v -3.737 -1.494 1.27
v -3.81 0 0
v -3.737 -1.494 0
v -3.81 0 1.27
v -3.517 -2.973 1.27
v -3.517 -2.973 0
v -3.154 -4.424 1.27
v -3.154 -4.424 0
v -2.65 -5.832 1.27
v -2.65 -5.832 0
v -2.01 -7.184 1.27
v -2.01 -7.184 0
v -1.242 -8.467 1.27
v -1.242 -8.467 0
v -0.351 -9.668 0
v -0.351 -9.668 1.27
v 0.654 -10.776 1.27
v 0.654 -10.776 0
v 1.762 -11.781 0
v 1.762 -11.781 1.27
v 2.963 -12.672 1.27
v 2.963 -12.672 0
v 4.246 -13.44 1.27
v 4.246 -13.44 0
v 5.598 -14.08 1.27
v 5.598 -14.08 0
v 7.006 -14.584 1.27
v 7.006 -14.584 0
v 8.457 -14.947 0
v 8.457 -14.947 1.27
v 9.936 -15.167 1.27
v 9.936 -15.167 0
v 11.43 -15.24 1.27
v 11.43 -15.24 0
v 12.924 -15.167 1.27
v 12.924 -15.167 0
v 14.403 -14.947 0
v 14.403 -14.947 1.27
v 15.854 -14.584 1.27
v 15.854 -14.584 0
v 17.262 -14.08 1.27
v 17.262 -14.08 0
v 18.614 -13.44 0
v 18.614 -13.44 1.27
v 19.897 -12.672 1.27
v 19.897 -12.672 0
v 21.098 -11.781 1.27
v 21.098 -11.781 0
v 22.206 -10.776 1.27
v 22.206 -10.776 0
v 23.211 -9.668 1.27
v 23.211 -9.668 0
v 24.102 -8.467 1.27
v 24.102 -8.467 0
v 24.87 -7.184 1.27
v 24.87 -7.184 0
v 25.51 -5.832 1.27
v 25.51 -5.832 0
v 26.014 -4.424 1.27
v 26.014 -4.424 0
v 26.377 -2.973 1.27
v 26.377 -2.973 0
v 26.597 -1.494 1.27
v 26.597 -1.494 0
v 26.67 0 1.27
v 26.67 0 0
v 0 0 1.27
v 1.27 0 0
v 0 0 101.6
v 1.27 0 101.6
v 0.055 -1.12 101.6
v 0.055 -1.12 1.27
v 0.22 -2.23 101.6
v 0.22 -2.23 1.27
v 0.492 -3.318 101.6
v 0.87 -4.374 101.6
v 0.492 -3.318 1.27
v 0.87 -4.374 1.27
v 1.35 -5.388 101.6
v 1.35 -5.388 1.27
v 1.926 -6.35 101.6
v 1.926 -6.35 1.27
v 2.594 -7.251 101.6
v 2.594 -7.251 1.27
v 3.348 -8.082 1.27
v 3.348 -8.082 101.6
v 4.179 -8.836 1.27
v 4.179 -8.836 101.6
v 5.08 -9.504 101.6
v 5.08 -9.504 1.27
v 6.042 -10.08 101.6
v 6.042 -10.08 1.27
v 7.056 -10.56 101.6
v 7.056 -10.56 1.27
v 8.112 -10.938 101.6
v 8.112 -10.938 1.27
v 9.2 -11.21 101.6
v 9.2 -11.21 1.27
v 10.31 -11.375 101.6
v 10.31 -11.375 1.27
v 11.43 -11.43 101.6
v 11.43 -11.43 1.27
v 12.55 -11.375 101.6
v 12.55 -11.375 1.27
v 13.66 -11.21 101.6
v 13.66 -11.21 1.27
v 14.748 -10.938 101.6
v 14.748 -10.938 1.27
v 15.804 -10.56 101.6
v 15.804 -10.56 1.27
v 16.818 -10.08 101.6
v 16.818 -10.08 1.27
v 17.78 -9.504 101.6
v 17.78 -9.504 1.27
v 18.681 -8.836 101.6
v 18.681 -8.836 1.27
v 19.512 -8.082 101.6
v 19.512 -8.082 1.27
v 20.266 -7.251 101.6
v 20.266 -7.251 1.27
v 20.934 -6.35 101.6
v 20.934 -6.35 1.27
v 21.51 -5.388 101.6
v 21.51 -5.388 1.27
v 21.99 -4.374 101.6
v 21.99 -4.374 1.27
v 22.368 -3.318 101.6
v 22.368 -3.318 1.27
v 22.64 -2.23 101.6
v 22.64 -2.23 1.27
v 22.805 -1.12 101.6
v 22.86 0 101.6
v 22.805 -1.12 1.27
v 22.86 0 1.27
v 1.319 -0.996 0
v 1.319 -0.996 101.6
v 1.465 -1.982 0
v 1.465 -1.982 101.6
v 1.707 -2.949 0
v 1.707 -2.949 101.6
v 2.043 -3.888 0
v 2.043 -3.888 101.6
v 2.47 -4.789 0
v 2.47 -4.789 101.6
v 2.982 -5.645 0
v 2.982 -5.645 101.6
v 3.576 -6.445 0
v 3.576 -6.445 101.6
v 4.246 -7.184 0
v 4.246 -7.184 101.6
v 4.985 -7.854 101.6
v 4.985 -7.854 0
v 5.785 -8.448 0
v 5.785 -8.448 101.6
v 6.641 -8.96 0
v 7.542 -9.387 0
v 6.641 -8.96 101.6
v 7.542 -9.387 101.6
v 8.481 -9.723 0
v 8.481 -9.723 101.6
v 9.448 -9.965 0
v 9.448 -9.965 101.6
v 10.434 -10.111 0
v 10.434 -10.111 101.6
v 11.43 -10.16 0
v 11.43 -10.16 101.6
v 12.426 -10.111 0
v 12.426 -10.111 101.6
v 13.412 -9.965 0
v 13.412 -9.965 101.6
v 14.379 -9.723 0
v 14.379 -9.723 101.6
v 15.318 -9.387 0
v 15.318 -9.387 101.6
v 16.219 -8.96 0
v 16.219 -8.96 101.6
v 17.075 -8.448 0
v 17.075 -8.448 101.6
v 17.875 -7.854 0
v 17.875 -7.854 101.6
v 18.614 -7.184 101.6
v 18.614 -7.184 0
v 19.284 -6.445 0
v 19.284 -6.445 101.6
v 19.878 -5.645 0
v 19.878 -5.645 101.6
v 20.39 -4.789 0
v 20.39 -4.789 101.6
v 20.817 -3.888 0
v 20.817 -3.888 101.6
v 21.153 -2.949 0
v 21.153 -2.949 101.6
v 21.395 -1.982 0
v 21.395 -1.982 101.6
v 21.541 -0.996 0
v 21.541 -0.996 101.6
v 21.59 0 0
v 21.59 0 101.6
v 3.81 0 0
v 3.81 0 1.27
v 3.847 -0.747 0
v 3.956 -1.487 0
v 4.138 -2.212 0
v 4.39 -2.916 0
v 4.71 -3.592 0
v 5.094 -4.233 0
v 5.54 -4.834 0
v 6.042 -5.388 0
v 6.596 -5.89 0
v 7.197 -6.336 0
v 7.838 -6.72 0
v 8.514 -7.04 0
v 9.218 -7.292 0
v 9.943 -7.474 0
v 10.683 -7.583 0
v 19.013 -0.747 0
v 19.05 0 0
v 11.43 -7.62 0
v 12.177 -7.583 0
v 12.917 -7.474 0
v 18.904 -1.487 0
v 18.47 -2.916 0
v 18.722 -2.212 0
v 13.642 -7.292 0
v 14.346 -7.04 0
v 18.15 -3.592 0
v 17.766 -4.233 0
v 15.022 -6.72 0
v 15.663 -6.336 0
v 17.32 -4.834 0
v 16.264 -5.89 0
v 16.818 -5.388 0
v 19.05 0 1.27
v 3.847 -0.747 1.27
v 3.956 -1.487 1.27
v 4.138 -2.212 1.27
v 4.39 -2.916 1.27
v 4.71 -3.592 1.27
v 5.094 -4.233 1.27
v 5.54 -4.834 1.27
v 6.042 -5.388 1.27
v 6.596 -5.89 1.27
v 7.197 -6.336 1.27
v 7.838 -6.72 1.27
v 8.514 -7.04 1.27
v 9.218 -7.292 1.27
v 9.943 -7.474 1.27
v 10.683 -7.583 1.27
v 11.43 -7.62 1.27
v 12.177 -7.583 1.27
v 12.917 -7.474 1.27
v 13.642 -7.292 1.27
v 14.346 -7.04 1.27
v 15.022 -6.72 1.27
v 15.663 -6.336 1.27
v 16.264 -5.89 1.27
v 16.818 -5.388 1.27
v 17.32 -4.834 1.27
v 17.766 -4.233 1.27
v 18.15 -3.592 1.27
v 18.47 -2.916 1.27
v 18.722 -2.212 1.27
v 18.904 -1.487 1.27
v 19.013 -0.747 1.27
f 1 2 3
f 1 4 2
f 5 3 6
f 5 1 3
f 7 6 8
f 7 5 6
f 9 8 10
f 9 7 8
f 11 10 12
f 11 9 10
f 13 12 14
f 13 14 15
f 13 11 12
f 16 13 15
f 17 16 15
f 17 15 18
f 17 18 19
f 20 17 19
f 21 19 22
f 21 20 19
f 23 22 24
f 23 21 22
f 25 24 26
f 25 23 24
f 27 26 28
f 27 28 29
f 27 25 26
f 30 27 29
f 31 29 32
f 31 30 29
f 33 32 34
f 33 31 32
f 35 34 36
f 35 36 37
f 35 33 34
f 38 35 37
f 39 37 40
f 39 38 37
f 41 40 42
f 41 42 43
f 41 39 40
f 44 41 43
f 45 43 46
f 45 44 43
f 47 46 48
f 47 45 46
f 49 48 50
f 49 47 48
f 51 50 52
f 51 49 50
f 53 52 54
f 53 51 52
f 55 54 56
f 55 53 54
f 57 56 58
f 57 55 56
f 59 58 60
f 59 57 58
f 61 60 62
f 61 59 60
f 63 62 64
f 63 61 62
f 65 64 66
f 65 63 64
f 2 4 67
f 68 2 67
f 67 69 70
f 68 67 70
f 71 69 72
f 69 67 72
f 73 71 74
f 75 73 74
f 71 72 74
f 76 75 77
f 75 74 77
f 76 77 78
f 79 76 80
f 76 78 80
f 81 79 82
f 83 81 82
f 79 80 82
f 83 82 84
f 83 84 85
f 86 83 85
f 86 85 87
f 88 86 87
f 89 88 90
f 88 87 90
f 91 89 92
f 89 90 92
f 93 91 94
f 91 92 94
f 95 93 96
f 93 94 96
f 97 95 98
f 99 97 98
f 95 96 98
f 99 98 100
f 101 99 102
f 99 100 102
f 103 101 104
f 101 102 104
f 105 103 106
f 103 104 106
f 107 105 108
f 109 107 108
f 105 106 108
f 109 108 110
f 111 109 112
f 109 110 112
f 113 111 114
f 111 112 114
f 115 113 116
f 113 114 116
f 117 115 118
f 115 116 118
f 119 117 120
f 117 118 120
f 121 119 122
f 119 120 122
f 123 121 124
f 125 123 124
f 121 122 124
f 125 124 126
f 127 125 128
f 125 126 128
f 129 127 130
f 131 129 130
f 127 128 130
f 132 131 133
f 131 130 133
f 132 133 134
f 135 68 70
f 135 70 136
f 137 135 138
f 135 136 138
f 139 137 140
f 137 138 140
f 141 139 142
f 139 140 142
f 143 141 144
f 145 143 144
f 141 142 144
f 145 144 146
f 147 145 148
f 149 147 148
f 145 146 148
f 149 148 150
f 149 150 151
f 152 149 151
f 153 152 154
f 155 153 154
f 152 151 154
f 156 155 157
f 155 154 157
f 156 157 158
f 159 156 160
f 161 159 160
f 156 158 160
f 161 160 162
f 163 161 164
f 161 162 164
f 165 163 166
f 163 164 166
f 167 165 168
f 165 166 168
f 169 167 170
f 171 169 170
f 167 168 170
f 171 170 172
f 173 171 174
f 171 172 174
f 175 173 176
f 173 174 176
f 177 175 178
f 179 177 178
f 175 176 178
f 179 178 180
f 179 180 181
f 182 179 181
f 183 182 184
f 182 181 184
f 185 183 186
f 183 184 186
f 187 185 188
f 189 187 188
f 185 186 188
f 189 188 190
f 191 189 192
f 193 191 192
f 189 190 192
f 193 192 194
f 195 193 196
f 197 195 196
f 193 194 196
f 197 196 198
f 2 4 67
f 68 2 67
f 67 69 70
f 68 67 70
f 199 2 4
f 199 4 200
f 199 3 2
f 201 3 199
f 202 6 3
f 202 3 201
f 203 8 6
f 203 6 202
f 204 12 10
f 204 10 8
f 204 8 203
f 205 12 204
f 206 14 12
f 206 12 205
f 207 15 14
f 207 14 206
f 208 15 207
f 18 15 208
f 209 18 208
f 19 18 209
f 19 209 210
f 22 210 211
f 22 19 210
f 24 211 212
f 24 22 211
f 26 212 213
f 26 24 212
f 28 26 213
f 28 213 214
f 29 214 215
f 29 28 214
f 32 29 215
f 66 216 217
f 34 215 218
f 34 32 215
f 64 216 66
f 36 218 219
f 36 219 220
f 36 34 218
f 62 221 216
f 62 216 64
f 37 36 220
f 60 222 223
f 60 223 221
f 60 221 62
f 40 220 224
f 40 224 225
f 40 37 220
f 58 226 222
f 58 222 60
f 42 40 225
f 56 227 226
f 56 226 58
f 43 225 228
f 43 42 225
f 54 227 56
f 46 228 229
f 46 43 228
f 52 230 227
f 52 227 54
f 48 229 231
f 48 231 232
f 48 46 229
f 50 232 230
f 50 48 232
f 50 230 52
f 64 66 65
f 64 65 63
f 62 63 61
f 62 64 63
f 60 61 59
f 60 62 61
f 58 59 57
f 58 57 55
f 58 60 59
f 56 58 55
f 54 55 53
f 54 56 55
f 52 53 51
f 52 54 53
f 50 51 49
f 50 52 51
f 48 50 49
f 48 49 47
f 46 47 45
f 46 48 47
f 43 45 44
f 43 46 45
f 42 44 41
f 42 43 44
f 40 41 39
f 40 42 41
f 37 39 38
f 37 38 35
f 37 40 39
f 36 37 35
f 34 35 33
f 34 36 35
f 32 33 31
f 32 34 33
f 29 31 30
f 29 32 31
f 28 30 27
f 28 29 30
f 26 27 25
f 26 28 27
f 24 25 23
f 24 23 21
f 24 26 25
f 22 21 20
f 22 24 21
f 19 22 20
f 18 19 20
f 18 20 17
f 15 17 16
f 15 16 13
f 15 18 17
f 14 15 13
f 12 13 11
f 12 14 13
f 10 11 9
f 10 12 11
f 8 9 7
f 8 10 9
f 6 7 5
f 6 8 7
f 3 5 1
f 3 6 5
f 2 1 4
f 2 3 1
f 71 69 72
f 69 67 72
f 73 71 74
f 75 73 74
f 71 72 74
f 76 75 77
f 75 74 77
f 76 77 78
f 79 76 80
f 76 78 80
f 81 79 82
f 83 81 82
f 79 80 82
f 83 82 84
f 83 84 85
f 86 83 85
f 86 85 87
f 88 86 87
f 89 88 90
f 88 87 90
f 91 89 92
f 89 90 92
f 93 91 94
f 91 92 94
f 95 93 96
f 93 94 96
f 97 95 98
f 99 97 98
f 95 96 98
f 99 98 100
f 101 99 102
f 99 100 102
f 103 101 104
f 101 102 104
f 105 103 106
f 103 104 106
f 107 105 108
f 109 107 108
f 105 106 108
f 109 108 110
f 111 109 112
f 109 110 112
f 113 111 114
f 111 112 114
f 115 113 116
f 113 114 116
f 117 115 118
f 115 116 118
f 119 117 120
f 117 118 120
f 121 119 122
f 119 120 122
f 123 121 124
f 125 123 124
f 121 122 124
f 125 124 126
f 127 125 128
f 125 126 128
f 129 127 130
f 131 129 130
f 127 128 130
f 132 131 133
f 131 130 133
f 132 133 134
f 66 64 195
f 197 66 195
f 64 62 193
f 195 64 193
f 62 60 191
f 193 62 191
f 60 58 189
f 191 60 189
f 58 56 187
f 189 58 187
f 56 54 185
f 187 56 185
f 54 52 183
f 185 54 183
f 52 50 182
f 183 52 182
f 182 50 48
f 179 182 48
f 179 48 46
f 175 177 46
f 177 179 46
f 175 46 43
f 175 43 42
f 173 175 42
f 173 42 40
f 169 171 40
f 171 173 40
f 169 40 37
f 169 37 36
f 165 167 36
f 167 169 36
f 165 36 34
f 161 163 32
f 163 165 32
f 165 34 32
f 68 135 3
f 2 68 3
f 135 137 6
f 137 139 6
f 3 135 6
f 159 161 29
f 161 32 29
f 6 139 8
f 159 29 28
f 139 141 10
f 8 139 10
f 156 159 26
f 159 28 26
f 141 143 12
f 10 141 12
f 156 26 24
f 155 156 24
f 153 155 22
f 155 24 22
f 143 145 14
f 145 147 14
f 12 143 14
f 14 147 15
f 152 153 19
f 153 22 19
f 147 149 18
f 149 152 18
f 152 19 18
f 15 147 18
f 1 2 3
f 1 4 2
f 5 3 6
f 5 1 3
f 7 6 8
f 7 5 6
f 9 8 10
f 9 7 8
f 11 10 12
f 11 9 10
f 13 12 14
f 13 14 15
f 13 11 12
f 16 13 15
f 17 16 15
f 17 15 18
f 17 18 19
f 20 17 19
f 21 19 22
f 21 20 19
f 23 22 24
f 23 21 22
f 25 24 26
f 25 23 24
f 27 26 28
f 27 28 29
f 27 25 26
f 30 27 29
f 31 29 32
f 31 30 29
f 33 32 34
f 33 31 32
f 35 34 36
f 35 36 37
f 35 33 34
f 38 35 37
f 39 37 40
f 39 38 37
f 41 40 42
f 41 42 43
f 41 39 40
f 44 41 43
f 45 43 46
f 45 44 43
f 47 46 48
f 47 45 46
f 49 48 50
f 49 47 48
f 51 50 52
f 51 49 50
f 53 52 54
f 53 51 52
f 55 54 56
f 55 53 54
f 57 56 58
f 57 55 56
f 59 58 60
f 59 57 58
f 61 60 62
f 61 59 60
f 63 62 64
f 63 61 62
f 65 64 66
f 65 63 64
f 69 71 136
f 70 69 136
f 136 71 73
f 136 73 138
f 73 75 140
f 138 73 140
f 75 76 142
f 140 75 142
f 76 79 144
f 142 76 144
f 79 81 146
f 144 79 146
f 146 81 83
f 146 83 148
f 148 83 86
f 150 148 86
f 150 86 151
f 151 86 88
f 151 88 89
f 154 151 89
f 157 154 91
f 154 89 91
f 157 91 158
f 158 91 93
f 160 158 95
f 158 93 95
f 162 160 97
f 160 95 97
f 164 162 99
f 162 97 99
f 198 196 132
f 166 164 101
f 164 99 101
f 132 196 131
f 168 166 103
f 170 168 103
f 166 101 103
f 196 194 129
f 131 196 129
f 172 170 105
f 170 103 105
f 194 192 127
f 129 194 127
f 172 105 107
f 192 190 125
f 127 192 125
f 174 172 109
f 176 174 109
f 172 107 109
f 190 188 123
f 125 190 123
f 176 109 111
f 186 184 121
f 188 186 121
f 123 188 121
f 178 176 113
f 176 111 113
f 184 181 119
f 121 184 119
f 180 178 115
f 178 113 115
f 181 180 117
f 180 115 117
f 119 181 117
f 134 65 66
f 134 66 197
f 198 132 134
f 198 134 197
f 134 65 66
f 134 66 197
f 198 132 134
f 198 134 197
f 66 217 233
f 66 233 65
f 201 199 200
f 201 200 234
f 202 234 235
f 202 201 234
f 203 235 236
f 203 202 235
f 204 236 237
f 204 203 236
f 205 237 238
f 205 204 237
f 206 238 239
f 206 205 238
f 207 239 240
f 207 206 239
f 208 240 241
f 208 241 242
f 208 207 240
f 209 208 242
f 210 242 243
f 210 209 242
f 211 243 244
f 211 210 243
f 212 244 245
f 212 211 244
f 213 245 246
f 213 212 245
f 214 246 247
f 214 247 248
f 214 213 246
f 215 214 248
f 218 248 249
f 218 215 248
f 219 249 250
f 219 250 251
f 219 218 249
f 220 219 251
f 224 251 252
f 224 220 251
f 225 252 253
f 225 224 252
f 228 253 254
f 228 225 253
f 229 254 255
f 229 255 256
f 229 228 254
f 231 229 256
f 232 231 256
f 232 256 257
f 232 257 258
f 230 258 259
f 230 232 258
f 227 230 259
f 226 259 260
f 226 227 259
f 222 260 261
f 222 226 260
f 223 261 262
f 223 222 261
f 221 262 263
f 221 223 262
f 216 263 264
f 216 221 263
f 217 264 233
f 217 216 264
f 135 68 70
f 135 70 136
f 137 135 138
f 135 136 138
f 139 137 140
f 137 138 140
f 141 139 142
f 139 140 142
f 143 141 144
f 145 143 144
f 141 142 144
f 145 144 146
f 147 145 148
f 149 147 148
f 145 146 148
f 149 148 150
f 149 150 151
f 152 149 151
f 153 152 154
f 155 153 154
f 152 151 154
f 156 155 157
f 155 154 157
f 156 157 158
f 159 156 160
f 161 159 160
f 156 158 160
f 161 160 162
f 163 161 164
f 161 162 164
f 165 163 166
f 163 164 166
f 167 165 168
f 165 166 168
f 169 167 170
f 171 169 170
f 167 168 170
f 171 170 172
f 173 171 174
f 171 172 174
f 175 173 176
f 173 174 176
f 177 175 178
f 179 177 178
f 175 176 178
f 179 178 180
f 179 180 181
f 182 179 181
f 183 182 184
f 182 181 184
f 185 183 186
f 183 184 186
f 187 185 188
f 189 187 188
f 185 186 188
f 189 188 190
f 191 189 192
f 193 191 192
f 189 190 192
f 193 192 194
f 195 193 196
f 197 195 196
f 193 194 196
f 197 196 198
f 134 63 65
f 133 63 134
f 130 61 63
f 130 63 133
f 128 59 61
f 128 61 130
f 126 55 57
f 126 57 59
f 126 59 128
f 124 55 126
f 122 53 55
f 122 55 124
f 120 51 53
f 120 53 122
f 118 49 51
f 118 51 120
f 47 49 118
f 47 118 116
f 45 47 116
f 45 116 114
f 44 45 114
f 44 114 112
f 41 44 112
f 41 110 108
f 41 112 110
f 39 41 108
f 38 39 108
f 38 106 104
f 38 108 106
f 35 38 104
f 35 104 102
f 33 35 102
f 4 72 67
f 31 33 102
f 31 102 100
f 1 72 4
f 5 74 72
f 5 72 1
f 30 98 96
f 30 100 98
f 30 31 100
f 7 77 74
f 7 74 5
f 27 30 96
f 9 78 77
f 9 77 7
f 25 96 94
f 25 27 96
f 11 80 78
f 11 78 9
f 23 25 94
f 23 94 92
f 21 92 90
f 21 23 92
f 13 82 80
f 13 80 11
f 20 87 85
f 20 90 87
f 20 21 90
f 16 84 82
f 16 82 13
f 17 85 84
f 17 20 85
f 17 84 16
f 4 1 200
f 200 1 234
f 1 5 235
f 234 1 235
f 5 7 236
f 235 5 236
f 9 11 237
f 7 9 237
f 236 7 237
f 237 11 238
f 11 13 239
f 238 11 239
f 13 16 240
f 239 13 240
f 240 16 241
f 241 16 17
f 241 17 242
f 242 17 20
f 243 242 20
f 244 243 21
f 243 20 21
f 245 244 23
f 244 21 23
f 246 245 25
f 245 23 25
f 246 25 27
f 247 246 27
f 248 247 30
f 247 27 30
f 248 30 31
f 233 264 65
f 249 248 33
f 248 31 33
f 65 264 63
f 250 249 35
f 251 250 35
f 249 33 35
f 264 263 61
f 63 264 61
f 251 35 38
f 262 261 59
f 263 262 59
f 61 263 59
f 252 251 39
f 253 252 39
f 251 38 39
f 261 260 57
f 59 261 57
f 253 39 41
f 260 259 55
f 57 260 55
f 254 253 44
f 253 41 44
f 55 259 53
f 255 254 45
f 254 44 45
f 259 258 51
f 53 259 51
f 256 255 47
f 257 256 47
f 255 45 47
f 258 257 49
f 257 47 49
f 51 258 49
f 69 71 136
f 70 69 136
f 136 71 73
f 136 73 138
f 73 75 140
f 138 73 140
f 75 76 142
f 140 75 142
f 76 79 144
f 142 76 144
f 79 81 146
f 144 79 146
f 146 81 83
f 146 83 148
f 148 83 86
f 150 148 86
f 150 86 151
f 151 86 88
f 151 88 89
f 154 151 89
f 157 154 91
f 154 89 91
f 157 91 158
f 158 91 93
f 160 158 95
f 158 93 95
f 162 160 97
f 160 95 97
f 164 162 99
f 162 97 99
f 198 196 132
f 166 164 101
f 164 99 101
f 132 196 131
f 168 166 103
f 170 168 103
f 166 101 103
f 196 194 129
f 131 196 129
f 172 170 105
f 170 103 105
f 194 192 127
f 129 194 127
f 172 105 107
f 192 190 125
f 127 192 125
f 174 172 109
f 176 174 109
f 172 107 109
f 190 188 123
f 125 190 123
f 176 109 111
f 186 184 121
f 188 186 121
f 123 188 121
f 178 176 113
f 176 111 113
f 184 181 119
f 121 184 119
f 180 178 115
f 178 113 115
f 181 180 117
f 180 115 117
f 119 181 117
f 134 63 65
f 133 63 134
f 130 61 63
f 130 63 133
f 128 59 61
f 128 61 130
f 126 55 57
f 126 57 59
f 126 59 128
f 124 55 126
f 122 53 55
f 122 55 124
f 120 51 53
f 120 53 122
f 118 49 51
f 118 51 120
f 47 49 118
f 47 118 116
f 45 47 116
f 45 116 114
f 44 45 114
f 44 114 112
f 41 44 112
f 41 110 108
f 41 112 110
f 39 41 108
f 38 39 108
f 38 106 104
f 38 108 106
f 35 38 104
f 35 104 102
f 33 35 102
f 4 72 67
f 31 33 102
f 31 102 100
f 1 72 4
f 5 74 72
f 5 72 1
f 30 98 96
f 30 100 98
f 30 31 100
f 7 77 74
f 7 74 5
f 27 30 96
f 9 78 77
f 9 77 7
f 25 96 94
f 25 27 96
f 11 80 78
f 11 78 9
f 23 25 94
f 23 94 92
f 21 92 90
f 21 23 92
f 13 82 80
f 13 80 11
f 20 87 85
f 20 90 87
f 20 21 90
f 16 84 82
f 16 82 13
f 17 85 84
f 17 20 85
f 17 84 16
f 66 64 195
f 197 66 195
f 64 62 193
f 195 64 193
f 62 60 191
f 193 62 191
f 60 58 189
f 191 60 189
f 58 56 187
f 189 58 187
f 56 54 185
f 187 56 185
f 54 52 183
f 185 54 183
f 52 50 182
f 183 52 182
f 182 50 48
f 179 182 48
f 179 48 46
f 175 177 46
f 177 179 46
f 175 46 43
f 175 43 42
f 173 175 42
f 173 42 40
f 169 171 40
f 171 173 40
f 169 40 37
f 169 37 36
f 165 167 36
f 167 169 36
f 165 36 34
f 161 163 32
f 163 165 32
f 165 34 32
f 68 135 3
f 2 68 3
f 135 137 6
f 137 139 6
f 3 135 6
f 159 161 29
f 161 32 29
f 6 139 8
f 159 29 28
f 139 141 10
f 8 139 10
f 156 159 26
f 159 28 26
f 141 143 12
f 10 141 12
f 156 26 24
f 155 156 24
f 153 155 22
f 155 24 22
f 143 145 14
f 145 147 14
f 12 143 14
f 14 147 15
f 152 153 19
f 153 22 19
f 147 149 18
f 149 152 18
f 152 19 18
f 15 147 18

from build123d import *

# Parameters (mm, degrees)
F0_W     = 3.81
F0_H     = 1.27
F1_ANGLE = 180
F2_ANGLE = 180
F4_DEPTH = 1.27


with BuildPart() as f1:
    # F0 (on Front) → F1 (revolve)
    with BuildSketch(Plane.XZ):
        with Locations((-1.905, 0.635)):
            Rectangle(F0_W, F0_H)
        Polygon((0, 1.27), (0, 0), (1.27, 0), (1.27, 101.6), (0, 101.6), align=None)
    revolve(axis=Axis((11.43, 0, 50.8), (0, 0, 1)), revolution_arc=F1_ANGLE)


with BuildPart() as f2:
    # F0 (on Front) → F2 (revolve)
    with BuildSketch(Plane.XZ):
        Polygon((0, 1.27), (0, 0), (1.27, 0), (1.27, 101.6), (0, 101.6), align=None)
        with Locations((-1.905, 0.635)):
            Rectangle(F0_W, F0_H)
    revolve(axis=Axis((11.43, 0, 50.8), (0, 0, 1)), revolution_arc=F2_ANGLE)


with BuildPart() as f4:
    # F3 (on face) → F4 (new body)
    with BuildSketch(Plane(origin=(0, 0, 0), x_dir=(1, 0, 0), z_dir=(0, 0, -1))):
        with BuildLine():
            ThreePointArc((3.81, 0), (11.43, 7.62), (19.05, 0))
            Line((19.05, 0), (21.59, 0))
            ThreePointArc((21.59, 0), (11.43, 10.16), (1.27, 0))
            Line((1.27, 0), (3.81, 0))
        make_face()
        with BuildLine():
            ThreePointArc((1.27, 0), (11.43, 10.16), (21.59, 0))
            Line((21.59, 0), (26.67, 0))
            ThreePointArc((26.67, 0), (11.43, 15.24), (-3.81, 0))
            Line((-3.81, 0), (1.27, 0))
        make_face()
    extrude(amount=-F4_DEPTH)


solid = Compound([f1.part, f2.part, f4.part])
